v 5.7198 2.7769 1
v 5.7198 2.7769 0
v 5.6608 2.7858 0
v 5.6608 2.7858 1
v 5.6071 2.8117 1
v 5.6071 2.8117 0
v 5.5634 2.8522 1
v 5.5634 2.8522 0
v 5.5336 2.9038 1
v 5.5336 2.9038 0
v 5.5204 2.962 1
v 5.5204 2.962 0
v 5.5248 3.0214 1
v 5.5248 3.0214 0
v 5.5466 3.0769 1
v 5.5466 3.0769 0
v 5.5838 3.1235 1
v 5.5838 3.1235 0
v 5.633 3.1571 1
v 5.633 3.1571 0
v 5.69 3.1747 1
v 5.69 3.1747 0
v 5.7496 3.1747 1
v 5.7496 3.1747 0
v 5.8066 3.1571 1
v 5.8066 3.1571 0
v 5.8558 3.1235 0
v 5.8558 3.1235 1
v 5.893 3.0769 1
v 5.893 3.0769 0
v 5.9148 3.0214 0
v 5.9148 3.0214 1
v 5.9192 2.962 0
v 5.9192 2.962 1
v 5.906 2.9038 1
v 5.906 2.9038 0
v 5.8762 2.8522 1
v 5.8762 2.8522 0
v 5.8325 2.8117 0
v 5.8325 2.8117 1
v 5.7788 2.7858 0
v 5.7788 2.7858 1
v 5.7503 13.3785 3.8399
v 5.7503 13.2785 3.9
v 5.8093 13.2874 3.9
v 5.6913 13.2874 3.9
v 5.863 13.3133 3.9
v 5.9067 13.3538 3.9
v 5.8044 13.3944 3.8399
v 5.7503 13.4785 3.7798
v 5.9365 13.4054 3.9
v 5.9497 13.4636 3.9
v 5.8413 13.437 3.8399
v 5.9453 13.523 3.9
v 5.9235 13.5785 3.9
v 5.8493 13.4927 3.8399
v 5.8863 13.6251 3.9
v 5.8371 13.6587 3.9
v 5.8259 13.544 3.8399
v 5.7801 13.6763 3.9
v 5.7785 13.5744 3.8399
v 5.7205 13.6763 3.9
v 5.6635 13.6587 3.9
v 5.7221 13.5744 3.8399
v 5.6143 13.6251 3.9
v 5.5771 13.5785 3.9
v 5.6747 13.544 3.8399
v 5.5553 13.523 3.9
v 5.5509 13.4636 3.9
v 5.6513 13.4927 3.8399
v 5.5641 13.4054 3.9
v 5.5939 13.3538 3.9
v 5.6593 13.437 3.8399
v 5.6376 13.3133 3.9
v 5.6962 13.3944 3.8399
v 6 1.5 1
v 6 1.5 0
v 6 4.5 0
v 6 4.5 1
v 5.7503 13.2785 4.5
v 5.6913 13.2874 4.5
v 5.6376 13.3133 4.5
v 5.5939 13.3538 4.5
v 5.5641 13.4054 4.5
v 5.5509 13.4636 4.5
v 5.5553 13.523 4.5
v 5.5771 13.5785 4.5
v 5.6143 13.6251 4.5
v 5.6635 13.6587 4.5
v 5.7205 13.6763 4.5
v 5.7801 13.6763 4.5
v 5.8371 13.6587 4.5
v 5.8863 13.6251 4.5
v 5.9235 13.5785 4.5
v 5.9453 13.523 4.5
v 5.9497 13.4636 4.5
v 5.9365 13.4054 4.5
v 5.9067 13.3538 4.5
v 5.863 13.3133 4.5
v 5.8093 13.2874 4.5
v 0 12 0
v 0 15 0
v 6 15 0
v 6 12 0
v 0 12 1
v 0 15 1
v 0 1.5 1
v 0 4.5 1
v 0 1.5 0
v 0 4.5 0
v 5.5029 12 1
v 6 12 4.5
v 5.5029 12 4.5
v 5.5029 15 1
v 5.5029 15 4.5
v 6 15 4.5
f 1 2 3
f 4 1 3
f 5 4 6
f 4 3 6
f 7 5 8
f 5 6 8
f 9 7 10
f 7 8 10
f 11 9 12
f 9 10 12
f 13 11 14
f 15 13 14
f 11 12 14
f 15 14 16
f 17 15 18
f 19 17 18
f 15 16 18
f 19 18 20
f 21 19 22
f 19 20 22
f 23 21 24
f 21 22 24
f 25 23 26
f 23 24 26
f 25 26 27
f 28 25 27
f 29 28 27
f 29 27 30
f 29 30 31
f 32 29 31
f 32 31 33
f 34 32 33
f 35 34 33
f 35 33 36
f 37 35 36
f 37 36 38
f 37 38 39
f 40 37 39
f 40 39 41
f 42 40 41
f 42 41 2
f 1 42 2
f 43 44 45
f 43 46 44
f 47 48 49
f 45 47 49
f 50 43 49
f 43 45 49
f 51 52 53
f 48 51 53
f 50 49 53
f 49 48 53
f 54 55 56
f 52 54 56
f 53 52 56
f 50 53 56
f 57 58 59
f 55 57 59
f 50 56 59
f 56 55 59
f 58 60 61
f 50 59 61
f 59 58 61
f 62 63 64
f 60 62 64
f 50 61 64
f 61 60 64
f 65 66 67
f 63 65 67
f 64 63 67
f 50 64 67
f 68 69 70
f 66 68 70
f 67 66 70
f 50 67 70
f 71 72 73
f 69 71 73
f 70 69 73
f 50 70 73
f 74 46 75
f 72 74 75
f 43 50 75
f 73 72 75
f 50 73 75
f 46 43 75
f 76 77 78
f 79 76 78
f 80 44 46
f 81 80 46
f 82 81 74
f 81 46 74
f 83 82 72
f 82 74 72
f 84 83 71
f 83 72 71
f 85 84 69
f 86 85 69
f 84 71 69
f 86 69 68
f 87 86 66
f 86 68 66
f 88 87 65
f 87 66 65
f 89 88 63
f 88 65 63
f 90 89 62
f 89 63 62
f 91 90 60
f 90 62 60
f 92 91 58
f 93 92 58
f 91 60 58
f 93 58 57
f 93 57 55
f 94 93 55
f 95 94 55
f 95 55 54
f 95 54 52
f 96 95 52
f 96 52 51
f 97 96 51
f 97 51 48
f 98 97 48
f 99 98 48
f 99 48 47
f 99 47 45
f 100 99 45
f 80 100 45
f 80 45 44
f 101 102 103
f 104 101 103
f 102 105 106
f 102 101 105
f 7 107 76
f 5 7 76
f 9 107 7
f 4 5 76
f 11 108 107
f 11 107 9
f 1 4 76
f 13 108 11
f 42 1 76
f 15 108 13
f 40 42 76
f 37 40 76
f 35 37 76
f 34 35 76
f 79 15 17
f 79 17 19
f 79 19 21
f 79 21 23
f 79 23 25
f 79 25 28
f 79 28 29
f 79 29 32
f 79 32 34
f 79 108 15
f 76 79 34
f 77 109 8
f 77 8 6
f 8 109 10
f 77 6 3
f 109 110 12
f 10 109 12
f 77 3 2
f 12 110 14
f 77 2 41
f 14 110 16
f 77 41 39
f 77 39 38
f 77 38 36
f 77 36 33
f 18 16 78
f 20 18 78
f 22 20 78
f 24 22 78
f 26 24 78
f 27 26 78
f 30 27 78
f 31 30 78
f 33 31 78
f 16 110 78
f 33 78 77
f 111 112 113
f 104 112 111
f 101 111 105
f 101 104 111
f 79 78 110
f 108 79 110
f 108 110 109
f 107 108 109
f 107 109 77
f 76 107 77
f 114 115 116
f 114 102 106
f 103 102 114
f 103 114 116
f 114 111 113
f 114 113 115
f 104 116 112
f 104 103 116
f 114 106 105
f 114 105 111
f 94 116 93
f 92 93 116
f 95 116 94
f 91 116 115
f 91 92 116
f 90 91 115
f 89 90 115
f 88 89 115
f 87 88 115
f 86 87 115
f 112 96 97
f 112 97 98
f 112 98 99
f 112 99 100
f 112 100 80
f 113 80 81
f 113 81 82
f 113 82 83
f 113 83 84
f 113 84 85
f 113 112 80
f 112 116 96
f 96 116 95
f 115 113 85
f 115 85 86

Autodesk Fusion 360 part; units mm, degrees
sketch "草图1" plane through (0, 0, 0) normal (0, 0, 1) x (1, 0, 0)
  line L0 (0, 15) -> (6, 15)
  line L1 (6, 15) -> (6, 12)
  line L2 (6, 12) -> (0, 12)
  line L3 (0, 12) -> (0, 15)
extrude "拉伸1" add sketch "草图1" along normal blind 1 makes body 1
sketch "草图2" plane through (0, 0, 0) normal (0, 0, 1) x (1, 0, 0)
  line L0 (0, 1.5) -> (6, 1.5)
  line L1 (6, 1.5) -> (6, 4.5)
  line L2 (6, 4.5) -> (0, 4.5)
  line L3 (0, 4.5) -> (0, 1.5)
extrude "拉伸2" add sketch "草图2" along normal blind 1 separate body makes body 2
sketch "草图3" plane through (0, 0, 1) normal (0, 0, 1) x (-1, 0, 0)
  line L0 (0, -12) -> (-6, -12)
  line L1 (-6, -12) -> (-6, -15)
  line L2 (-6, -15) -> (0, -15)
  line L3 (0, -15) -> (0, -12)
  line L4 (-5.5029, -15) -> (-6, -15)
  line L5 (-6, -15) -> (-6, -12)
  line L6 (-6, -12) -> (-5.5029, -12)
  line L7 (-5.5029, -12) -> (-5.5029, -15)
extrude "拉伸3" add sketch "草图3" along normal blind 3.5 contours L0 L1 L2 L4 L5 L6 L7 bodies 1
hole "孔1" at (5.7503, 13.4785, 4.5) direction (0, 0, -1) diameter 0.4 depth 0.6 tip angle 118 bodies 1
hole "孔2" at (5.7198, 2.9769, 1) direction (0, 0, -1) diameter 0.4 depth 1 tip angle 118 bodies 2
